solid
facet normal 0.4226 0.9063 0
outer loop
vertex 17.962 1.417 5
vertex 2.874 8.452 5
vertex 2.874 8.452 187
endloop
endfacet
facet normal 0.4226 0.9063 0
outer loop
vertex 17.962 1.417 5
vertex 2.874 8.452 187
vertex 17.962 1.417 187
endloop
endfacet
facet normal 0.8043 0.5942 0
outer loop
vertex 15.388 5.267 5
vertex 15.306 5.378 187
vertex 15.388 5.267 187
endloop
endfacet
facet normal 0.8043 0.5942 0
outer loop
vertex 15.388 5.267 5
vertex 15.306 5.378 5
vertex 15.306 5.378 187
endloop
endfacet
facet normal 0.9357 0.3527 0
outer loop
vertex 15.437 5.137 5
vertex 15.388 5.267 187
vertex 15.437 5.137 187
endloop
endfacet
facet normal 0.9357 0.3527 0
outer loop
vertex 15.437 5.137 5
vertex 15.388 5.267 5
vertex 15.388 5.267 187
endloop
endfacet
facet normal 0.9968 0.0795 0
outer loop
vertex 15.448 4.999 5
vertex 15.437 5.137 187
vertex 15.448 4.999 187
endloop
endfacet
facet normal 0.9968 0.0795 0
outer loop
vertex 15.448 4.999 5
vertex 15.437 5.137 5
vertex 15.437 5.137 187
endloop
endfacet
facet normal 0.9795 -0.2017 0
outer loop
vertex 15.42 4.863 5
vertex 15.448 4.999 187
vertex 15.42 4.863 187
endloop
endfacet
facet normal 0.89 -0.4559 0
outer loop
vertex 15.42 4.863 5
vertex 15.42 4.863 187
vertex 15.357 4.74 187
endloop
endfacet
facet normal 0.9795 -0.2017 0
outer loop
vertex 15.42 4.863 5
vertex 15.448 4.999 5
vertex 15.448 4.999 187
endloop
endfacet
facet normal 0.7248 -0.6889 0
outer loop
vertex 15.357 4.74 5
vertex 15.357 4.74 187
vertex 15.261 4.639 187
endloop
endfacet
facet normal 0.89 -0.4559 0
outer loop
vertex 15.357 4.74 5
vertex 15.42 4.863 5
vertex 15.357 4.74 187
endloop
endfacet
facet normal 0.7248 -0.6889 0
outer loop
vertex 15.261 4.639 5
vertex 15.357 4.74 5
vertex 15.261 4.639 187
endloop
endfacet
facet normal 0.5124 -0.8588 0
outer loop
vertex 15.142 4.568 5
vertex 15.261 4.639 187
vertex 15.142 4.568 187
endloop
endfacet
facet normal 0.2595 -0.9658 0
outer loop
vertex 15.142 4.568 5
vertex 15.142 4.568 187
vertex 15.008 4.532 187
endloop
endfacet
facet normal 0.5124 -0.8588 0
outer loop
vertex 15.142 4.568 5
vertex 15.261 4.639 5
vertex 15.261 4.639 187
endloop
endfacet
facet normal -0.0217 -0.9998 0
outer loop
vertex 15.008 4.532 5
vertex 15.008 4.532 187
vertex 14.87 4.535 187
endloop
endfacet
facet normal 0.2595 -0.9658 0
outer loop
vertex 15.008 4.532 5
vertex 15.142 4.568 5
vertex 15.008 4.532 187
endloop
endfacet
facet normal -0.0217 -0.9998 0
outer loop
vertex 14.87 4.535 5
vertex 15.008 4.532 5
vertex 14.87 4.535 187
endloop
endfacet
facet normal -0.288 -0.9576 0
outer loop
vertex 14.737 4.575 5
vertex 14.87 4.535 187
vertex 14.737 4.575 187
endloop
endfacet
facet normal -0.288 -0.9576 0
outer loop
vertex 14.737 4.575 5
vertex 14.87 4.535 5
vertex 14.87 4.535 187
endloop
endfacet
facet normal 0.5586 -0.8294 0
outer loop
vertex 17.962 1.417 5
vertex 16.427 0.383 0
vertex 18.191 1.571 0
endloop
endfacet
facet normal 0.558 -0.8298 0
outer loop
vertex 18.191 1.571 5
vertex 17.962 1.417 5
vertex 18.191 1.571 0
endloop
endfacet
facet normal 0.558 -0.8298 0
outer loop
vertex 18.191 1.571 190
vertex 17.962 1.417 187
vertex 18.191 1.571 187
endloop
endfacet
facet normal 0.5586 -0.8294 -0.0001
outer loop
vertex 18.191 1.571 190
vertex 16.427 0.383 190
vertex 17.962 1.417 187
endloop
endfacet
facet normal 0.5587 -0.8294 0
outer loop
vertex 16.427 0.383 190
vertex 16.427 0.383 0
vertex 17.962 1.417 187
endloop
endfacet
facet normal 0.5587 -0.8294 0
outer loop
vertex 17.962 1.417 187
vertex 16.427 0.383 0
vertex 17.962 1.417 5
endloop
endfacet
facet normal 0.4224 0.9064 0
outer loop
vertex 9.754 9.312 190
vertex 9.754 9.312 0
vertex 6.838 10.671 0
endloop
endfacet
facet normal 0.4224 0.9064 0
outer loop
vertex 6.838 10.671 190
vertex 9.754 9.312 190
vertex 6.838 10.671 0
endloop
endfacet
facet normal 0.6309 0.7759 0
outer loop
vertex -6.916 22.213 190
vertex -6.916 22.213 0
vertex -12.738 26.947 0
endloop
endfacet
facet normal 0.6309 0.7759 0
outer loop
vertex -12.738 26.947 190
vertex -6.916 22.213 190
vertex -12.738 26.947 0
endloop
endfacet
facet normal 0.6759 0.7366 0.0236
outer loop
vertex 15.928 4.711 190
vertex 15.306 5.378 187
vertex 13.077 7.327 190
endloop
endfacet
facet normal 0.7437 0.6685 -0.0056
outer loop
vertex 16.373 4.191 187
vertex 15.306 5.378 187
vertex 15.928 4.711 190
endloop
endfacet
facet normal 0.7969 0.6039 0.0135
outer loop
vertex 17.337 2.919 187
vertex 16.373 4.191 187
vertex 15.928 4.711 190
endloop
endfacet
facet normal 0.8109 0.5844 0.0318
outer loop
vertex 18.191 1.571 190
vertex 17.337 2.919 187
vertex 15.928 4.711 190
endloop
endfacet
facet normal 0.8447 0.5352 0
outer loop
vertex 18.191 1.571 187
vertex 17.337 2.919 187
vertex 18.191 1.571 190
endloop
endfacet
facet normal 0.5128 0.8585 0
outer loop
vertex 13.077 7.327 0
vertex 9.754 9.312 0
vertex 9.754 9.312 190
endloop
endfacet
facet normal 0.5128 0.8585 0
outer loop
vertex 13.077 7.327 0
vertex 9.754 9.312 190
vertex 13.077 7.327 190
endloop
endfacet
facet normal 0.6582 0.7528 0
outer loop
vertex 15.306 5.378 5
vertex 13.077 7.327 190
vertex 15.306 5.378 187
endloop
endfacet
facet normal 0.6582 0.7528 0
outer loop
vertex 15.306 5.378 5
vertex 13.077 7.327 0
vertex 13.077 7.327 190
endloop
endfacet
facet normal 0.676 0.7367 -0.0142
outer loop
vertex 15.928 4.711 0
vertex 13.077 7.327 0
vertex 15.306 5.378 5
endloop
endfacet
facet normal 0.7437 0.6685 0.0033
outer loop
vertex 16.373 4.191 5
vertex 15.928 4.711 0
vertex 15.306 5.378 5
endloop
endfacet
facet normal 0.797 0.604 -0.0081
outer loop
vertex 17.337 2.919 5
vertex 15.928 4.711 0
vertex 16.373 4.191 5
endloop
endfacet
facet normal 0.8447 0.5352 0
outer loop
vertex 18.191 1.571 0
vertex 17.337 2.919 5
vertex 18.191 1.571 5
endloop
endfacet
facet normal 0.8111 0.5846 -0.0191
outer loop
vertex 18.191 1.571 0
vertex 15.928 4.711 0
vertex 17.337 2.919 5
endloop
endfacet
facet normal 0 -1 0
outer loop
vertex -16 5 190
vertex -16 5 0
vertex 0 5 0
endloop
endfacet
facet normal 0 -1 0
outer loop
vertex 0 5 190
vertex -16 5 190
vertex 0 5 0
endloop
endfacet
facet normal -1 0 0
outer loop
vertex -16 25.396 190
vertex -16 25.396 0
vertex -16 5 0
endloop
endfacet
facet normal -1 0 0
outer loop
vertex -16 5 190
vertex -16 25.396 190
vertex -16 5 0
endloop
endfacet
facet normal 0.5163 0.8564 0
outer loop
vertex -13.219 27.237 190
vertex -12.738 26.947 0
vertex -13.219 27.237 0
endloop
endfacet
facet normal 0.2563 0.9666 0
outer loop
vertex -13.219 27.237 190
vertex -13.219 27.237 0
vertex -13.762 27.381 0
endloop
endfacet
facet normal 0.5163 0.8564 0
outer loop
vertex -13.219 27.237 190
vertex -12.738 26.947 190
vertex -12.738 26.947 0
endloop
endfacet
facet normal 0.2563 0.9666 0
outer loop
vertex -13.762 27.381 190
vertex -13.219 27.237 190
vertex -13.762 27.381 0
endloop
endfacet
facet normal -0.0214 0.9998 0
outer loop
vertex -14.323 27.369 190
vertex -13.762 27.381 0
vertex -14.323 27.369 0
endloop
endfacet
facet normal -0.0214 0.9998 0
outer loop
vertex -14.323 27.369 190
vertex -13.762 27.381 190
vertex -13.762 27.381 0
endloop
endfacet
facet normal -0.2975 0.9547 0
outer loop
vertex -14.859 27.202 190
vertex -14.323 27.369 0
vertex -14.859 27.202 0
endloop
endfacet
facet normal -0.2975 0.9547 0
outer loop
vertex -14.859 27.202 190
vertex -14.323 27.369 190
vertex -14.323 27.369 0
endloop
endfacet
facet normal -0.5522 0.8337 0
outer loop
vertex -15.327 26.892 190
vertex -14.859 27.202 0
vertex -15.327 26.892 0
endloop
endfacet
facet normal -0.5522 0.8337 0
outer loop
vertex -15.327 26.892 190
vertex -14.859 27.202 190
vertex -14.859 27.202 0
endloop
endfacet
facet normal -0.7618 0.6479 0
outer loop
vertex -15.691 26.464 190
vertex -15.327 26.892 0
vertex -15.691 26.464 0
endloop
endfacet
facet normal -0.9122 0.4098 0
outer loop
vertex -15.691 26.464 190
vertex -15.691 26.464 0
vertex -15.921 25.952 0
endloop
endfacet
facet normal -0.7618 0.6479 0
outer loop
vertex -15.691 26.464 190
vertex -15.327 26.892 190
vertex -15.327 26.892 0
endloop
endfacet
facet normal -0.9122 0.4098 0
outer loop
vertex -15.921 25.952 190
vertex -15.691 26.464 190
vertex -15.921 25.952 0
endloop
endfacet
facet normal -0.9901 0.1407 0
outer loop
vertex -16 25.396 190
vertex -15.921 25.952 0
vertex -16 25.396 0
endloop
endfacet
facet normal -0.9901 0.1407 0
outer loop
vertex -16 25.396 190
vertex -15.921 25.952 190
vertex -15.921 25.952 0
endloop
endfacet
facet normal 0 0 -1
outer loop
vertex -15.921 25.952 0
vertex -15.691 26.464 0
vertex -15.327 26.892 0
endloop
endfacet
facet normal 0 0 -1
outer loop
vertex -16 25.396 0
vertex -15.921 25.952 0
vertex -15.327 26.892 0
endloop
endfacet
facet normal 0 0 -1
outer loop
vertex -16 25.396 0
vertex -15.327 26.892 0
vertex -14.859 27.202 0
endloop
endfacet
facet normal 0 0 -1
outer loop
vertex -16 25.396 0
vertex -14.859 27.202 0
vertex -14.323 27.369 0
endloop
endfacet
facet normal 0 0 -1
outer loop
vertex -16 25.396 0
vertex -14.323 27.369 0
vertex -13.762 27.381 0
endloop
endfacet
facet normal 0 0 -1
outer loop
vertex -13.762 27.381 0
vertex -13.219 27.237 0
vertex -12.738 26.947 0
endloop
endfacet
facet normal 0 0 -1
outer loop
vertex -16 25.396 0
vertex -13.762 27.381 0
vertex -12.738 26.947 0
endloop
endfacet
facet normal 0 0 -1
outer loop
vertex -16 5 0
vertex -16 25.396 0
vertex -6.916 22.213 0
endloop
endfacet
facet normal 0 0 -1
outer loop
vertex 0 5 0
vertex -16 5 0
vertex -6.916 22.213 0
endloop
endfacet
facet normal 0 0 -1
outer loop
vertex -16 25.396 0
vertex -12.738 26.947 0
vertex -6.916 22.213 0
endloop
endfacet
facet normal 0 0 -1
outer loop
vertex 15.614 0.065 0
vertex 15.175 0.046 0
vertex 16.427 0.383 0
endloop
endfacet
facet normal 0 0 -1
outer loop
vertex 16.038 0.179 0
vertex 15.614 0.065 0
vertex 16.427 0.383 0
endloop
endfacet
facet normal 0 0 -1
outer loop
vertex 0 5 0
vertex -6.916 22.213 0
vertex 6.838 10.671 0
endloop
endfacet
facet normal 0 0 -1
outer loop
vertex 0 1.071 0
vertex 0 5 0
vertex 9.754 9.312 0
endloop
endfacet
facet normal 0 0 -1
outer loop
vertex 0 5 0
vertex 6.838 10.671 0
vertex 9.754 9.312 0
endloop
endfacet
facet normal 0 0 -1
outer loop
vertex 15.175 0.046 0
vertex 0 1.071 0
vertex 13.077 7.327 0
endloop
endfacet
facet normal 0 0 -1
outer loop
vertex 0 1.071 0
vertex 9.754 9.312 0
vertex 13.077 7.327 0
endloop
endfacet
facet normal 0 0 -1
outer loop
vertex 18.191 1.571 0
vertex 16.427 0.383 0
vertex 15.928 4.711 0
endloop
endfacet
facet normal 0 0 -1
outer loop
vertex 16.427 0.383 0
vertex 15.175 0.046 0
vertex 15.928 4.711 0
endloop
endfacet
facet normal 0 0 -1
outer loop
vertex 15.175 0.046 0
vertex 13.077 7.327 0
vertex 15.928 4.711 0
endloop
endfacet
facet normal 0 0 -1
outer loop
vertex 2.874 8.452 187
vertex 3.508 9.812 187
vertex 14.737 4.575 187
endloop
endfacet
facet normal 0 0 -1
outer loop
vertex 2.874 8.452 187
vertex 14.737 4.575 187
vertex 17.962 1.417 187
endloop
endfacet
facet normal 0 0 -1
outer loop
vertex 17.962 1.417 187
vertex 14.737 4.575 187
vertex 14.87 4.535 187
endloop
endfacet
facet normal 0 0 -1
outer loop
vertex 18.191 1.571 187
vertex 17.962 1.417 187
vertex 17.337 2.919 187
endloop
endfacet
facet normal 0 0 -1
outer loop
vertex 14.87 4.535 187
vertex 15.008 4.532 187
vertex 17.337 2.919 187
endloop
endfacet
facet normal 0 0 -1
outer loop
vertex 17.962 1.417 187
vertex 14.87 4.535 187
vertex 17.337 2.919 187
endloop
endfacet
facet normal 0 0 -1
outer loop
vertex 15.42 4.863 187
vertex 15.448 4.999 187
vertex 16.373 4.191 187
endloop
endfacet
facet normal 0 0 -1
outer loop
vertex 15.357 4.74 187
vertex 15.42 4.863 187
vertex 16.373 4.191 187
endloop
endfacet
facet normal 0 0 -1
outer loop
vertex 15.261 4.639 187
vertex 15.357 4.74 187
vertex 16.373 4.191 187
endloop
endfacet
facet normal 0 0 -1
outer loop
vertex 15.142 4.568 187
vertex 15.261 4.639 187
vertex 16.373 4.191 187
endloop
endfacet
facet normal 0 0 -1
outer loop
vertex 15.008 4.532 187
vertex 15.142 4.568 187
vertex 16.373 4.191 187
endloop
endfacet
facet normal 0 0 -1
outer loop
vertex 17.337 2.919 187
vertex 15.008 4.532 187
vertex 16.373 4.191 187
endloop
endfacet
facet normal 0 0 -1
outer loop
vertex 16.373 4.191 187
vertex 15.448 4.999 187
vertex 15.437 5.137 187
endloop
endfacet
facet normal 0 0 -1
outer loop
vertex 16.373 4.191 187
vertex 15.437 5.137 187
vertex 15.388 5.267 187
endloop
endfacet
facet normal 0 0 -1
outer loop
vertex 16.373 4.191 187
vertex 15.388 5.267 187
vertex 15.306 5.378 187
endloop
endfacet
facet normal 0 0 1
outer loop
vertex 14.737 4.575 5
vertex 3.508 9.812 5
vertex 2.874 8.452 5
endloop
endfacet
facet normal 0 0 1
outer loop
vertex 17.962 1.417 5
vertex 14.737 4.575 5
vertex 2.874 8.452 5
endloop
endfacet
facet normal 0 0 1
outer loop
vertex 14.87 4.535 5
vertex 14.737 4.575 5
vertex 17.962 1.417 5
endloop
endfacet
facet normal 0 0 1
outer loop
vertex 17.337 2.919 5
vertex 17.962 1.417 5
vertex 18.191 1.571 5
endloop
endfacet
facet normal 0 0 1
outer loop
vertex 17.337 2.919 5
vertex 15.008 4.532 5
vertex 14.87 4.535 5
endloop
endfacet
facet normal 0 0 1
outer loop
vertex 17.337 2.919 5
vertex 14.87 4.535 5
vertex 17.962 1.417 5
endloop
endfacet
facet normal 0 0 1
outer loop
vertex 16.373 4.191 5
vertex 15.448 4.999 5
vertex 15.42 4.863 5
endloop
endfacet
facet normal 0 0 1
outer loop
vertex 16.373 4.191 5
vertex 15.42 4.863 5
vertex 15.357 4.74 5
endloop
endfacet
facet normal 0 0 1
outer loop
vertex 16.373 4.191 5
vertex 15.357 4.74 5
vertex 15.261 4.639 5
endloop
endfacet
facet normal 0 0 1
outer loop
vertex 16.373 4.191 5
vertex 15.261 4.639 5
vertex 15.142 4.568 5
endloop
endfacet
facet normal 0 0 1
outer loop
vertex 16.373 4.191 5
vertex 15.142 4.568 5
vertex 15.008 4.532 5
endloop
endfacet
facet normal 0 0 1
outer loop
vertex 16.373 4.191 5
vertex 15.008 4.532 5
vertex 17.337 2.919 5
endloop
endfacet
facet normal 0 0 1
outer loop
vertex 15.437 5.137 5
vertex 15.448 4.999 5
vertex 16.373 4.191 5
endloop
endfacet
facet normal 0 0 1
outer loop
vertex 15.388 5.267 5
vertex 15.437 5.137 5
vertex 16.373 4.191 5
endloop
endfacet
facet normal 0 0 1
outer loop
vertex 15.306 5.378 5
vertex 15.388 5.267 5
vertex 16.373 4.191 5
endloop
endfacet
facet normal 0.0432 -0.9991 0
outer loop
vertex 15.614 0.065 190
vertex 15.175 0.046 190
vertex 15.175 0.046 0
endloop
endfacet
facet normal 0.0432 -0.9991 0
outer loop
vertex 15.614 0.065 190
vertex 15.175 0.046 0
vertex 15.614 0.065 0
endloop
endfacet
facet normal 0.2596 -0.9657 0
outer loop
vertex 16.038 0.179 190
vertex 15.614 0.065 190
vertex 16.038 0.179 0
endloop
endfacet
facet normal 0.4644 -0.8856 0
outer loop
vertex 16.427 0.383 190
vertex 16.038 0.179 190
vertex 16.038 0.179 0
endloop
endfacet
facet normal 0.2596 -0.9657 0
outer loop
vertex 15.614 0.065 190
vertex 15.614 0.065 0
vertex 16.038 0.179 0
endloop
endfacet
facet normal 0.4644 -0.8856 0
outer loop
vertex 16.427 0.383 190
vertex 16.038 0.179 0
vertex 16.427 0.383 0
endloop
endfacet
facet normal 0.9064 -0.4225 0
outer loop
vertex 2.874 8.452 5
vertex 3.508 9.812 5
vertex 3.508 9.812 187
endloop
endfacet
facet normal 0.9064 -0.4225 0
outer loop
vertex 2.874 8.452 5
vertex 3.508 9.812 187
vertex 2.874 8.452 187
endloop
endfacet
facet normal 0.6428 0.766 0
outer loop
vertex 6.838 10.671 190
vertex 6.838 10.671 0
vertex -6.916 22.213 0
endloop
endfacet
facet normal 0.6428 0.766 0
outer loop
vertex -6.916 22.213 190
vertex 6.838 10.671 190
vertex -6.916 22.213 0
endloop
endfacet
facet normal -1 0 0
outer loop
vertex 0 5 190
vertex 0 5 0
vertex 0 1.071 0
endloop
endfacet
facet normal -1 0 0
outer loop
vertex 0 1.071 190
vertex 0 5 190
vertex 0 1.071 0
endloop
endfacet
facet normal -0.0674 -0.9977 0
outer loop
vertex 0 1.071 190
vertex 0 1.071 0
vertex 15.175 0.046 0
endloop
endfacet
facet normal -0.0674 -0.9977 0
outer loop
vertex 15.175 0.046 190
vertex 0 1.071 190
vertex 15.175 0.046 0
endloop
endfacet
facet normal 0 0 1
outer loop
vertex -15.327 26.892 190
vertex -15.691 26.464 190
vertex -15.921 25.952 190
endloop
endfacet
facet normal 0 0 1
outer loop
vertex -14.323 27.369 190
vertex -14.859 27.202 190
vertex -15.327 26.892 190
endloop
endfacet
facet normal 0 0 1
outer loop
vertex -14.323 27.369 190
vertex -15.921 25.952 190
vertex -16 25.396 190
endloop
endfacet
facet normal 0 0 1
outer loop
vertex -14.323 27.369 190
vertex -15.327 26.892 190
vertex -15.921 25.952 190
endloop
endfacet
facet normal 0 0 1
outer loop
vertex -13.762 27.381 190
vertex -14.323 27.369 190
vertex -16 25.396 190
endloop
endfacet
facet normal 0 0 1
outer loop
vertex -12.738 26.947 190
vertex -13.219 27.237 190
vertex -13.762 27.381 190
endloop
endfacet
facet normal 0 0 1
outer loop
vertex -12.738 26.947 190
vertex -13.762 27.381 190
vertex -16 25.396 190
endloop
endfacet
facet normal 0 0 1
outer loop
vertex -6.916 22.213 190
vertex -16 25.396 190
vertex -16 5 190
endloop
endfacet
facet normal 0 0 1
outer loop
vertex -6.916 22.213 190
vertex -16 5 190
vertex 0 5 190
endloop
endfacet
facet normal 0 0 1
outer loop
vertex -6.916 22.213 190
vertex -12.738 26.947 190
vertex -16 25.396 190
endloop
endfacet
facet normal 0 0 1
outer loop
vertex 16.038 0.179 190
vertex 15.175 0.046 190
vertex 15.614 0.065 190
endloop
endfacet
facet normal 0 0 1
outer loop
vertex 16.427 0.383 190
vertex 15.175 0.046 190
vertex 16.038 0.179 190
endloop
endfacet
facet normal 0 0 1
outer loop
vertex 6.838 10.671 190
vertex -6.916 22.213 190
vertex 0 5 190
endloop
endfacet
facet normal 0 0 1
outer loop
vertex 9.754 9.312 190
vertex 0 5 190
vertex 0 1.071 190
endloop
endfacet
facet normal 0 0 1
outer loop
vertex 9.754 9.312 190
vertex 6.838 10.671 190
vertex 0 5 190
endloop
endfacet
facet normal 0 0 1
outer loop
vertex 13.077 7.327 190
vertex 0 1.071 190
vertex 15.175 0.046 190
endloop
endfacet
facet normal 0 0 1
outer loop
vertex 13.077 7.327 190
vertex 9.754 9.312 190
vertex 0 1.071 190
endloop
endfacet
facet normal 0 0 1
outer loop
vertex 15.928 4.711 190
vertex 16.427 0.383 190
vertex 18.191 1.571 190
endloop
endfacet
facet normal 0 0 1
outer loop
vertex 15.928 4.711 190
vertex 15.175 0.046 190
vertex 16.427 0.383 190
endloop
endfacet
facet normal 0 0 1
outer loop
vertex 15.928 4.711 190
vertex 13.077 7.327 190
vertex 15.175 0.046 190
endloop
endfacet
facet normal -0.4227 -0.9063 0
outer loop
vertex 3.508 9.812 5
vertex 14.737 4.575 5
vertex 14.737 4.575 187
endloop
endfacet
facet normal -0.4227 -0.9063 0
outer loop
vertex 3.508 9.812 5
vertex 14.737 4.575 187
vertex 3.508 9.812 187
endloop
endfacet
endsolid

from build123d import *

# Parameters (mm, degrees)
BOSS_EXTRUDE1_DEPTH = 190
CUT_EXTRUDE1_START  = 5
CUT_EXTRUDE1_DEPTH  = 182
FILLET3_START       = -1
FILLET3_DEPTH       = 192
CUT_EXTRUDE3_DEPTH  = 203
FILLET4_R           = 0.5
FILLET5_R           = 2
FILLET6_R           = 2


with BuildPart() as part:
    # Sketch1 → Boss-Extrude1 (new body)
    with BuildSketch(Plane.XY):
        Polygon((0, 0), (19, 0), (19, 5), (6.83805717, 10.67120708), (-6.91649822, 22.212649435), (-16, 29.600046382), (-16, 12.189630226), (-16, 5), (0, 5), align=None)
    extrude(amount=BOSS_EXTRUDE1_DEPTH)

    # Sketch2 → Cut-Extrude1 (cut)
    with BuildSketch(Plane.XY.offset(CUT_EXTRUDE1_START)):
        Polygon((21.633927393, 1.359461681), (3.507771652, 9.811826915), (2.873844259, 8.452365235), (21, 0), align=None)
    extrude(amount=CUT_EXTRUDE1_DEPTH, mode=Mode.SUBTRACT)

    # Fillet3: read off the stored shape, not the designer's step
    # Fillet3 outline → Fillet3 (cut)
    with BuildSketch(Plane.XY.offset(FILLET3_START)):
        with BuildLine():
            Line((19, 5), (9.753768459, 9.311588577))
            ThreePointArc((9.753768459, 9.311588577), (15.206282278, 5.479370881), (19, 0))
            Line((19, 0), (19, 5))
        make_face()
    extrude(amount=FILLET3_DEPTH, mode=Mode.SUBTRACT)

    # Sketch6 → Cut-Extrude3 (cut)
    with BuildSketch(Plane.XY.offset(190)):
        Polygon((0, 1.071241245), (15.85883014, 0), (18.190743079, 1.570510584), (20.776431757, 1.395851019), (18.077940116, -2.328162287), (-1.219539475, -1.555674607), (-2.427097473, 0.237321984), align=None)
    extrude(amount=-CUT_EXTRUDE3_DEPTH, mode=Mode.SUBTRACT)

    # Fillet4
    fillet4_edges = [part.edges().sort_by_distance(p)[0] for p in [
        (16.849447034, 3.590501512, 96),
    ]]
    fillet(fillet4_edges, radius=FILLET4_R)

    # Fillet5
    fillet5_edges = [part.edges().sort_by_distance(p)[0] for p in [
        (15.85883014, 0, 95),
    ]]
    fillet(fillet5_edges, radius=FILLET5_R)

    # Fillet6
    fillet6_edges = [part.edges().sort_by_distance(p)[0] for p in [
        (-16, 29.600046382, 95),
    ]]
    fillet(fillet6_edges, radius=FILLET6_R)


solid = part.part
